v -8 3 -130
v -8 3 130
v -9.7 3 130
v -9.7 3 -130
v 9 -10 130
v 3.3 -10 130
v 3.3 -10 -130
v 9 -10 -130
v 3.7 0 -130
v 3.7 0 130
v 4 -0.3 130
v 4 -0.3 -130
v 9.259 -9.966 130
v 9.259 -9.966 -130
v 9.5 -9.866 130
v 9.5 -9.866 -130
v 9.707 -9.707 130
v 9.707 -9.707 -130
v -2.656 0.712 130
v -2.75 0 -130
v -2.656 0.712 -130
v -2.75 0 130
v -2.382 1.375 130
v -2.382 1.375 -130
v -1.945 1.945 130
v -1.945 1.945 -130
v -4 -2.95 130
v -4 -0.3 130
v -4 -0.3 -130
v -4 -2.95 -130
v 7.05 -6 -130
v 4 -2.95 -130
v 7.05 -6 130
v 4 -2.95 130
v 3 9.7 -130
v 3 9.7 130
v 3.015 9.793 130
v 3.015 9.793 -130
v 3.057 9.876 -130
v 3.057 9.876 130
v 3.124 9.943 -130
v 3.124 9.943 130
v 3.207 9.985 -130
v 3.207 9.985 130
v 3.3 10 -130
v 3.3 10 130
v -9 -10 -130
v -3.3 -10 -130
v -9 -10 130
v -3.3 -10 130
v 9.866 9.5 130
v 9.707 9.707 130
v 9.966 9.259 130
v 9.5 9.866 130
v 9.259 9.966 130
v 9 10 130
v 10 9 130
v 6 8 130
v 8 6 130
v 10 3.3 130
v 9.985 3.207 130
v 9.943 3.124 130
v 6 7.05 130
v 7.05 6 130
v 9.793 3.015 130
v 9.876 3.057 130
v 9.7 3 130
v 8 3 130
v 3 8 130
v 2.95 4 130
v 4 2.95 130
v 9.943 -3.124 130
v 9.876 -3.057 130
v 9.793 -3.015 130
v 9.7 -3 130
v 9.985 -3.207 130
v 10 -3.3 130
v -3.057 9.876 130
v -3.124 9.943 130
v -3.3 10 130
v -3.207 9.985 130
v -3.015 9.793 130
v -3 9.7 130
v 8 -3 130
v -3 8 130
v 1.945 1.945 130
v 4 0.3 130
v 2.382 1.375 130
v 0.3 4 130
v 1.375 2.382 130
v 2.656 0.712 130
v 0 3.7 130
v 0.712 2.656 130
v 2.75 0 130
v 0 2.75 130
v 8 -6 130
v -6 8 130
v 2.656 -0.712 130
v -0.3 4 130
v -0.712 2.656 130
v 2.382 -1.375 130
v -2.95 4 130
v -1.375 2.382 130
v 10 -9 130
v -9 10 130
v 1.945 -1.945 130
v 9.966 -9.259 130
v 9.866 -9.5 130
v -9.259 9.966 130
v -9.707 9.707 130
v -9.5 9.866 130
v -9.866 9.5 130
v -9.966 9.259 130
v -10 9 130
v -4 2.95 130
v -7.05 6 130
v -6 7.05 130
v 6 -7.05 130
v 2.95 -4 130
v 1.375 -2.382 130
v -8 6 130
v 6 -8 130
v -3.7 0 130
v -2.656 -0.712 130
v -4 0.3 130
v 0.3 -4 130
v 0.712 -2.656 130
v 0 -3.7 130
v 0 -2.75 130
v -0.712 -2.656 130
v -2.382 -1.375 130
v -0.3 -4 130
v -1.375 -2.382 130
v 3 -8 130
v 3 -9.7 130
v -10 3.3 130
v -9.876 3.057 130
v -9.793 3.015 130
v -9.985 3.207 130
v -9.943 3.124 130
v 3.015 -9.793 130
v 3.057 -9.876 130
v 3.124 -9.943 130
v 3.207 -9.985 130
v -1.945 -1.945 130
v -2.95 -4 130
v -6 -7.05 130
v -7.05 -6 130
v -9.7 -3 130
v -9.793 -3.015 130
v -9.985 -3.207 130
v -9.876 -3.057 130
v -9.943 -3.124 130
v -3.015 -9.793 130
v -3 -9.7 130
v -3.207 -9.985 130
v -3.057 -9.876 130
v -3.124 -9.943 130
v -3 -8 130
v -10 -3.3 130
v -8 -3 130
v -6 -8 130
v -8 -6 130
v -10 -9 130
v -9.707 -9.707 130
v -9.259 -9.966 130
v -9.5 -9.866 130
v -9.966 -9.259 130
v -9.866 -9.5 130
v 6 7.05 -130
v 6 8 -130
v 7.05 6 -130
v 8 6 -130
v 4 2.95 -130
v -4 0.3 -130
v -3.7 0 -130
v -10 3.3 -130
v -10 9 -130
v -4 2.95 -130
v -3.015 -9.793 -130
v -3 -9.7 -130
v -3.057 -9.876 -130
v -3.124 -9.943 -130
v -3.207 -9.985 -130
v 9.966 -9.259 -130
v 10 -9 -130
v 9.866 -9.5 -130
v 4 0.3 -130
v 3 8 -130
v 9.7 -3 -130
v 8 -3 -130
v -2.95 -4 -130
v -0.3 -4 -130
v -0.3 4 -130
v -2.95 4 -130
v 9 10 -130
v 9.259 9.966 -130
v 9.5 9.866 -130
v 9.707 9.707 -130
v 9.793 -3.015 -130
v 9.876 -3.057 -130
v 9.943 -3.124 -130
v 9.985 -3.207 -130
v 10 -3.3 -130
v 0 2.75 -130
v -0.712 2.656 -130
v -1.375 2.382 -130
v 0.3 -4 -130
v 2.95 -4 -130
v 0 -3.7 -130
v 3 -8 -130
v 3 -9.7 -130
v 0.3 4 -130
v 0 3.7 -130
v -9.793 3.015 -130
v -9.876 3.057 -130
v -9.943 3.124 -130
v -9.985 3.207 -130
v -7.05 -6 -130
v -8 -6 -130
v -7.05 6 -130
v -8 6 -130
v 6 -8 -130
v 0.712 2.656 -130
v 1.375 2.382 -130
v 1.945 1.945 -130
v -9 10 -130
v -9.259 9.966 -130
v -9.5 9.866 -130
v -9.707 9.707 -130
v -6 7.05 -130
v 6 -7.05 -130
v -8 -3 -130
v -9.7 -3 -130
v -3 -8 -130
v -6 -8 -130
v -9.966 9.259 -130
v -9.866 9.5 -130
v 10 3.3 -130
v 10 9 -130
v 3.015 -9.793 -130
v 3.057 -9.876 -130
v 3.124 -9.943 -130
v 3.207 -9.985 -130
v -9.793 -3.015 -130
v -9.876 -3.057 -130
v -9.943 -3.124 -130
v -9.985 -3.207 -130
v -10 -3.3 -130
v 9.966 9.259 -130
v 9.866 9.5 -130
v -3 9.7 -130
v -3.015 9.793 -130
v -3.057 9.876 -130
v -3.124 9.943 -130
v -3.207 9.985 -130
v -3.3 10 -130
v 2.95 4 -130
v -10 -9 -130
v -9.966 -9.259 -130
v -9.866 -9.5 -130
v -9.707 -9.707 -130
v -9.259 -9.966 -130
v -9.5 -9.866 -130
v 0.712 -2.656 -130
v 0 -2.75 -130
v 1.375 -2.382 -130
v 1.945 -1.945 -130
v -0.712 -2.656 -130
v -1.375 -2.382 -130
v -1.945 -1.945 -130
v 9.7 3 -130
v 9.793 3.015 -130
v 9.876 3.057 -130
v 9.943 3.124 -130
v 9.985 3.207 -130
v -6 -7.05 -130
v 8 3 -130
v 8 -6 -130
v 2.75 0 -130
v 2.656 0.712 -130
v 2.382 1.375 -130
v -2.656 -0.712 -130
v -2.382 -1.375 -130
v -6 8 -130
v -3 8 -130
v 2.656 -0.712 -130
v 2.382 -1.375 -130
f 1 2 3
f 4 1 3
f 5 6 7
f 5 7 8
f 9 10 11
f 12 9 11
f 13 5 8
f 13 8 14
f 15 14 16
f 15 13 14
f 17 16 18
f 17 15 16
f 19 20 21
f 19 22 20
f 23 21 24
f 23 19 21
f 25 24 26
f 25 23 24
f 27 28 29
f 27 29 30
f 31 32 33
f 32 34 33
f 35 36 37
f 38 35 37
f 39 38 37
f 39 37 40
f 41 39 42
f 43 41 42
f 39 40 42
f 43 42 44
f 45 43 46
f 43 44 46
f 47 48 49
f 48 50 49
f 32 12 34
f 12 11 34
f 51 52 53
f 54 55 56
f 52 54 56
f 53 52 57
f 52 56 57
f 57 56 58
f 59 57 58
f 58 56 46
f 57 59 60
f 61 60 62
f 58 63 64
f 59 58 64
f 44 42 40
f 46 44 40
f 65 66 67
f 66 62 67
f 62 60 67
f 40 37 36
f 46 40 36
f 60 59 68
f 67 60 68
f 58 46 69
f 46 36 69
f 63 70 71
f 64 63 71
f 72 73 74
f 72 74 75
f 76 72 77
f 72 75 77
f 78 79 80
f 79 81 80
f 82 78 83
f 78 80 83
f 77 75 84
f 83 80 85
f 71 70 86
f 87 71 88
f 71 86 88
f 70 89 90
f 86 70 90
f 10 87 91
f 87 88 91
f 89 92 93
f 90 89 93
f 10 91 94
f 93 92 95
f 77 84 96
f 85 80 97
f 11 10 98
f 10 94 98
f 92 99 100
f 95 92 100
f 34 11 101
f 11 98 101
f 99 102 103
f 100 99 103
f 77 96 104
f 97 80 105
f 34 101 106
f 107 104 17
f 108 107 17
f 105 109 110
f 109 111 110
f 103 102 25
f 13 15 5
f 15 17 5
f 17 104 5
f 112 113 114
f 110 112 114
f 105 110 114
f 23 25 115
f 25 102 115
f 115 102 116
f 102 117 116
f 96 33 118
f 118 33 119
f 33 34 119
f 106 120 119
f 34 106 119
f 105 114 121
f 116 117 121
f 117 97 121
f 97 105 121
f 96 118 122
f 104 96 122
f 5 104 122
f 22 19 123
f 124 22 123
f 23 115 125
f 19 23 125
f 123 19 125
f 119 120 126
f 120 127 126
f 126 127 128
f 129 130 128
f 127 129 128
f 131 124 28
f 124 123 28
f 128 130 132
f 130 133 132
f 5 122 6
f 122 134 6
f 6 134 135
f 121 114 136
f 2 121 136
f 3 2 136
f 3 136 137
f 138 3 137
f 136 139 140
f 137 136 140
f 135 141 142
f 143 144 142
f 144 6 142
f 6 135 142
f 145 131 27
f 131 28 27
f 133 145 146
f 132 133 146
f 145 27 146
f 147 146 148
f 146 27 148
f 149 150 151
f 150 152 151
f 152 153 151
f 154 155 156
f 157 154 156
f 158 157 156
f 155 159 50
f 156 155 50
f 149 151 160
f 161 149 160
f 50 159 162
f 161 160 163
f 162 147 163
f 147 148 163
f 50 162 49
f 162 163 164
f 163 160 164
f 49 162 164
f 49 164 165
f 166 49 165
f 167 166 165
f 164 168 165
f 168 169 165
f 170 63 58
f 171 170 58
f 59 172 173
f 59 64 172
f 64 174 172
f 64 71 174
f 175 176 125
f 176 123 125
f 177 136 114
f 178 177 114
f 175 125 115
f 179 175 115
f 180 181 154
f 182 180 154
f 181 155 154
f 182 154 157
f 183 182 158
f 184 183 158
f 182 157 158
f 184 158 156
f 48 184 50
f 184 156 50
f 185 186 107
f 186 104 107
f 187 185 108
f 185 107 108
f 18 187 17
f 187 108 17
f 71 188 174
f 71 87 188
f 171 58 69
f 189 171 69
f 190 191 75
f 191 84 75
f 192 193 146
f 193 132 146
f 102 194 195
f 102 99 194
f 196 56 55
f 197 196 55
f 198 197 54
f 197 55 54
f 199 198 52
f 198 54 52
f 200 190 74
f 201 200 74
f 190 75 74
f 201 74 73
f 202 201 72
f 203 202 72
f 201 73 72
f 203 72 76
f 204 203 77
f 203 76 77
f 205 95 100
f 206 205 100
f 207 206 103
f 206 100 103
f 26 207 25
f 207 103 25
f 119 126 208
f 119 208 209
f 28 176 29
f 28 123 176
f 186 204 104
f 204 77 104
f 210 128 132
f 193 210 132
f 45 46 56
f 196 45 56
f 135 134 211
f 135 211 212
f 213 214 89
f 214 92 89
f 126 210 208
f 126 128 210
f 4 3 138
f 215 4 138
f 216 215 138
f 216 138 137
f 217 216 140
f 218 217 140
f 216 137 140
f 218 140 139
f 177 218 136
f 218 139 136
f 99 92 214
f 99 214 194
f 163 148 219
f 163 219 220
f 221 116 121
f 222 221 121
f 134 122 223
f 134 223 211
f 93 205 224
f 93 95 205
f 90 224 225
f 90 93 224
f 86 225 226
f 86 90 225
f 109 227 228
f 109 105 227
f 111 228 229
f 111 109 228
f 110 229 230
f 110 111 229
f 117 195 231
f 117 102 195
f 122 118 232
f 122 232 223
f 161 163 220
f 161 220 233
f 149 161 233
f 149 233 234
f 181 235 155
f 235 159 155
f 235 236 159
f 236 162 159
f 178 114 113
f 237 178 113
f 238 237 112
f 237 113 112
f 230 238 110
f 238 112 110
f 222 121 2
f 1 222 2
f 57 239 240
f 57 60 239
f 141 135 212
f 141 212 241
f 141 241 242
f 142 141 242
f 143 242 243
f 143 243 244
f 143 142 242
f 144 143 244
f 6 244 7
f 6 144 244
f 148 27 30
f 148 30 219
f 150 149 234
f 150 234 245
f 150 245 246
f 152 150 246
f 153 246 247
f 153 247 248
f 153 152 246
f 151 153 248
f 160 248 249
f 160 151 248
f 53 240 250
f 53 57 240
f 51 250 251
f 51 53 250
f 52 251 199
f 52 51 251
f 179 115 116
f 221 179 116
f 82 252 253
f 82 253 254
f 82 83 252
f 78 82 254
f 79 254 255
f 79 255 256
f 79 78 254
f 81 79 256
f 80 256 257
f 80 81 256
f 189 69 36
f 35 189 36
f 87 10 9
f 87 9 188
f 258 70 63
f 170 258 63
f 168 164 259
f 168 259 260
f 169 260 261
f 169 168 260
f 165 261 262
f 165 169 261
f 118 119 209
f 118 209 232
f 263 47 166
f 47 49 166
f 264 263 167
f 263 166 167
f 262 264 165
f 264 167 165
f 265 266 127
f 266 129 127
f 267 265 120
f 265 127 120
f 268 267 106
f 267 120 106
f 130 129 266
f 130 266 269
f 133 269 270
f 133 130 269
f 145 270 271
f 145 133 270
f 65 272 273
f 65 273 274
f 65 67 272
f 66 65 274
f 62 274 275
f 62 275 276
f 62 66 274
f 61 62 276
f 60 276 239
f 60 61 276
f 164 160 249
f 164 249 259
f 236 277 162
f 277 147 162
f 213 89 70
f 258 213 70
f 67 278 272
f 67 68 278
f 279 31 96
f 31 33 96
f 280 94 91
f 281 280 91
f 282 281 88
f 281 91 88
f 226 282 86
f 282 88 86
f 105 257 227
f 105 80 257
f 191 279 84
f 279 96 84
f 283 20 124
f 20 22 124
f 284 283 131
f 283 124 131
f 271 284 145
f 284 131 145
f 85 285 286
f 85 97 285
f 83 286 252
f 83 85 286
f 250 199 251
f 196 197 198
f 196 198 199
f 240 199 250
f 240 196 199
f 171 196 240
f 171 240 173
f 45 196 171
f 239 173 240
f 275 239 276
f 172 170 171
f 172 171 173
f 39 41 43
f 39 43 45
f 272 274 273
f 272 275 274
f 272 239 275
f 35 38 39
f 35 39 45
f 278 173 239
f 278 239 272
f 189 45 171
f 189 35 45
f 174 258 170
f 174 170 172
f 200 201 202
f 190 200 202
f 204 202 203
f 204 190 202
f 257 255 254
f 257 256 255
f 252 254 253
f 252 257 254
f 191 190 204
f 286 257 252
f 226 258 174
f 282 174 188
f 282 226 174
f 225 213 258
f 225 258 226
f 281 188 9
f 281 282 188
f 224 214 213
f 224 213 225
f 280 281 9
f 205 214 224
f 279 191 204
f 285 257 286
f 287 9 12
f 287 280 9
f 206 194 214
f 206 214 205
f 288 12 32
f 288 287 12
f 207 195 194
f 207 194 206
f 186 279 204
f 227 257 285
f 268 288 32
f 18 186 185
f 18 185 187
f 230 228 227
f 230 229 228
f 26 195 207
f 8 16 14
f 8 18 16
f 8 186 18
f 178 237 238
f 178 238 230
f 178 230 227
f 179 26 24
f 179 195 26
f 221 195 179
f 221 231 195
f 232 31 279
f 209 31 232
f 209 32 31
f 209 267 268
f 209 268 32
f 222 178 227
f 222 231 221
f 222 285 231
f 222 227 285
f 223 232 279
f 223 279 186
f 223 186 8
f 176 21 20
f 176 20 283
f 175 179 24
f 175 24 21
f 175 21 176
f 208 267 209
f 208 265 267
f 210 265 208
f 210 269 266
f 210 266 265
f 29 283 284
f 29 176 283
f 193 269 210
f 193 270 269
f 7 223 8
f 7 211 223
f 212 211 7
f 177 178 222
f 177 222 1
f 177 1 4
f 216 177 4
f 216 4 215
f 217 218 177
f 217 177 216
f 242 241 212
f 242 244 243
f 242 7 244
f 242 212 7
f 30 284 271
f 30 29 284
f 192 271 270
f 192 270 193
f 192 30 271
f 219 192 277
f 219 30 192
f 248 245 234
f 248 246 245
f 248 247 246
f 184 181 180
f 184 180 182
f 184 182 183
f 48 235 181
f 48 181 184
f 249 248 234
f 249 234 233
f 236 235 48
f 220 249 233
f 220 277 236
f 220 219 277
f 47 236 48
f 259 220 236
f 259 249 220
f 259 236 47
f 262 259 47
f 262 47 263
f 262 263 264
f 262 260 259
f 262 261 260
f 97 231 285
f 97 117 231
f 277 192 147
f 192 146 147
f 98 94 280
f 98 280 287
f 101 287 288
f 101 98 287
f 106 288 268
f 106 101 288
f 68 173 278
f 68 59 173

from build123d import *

# Parameters (mm, degrees)
PAD001_DEPTH                             = 130
PAD001_MIRRORED003_2_DEPTH               = 130
PAD001_MIRRORED004_2_DEPTH               = 130
PAD001_MIRRORED003_2_MIRRORED004_2_DEPTH = 130


with BuildPart() as part:
    # Sketch001 → Pad001 (new body, symmetric)
    with BuildSketch(Plane.XY):
        with BuildLine():
            Line((-3.7, 0), (-4, -0.3))
            Line((-4, -0.3), (-4, -2.95))
            Line((-4, -2.95), (-7.05, -6))
            Line((-7.05, -6), (-8, -6))
            Line((-8, -6), (-8, -3))
            Line((-8, -3), (-9.7, -3))
            ThreePointArc((-9.7, -3), (-9.912132, -3.087868), (-10, -3.3))
            Line((-10, -3.3), (-10, -9))
            ThreePointArc((-10, -9), (-9.92388, -9.382683), (-9.707107, -9.707107))
            Line((-1.944544, -1.944544), (-9.707107, -9.707107))
            ThreePointArc((-2.75, 0), (-2.540669, -1.052379), (-1.944544, -1.944544))
            Line((-3.7, 0), (-2.75, 0))
        make_face()
    pad001 = extrude(amount=PAD001_DEPTH, both=True)

    # Sketch001 Mirrored003 2 → Pad001 Mirrored003 2 (add, symmetric)
    with BuildSketch(Plane.YX):
        with BuildLine():
            Line((-3.7, 0), (-4, -0.3))
            Line((-4, -0.3), (-4, -2.95))
            Line((-4, -2.95), (-7.05, -6))
            Line((-7.05, -6), (-8, -6))
            Line((-8, -6), (-8, -3))
            Line((-8, -3), (-9.7, -3))
            ThreePointArc((-9.7, -3), (-9.912132, -3.087868), (-10, -3.3))
            Line((-10, -3.3), (-10, -9))
            ThreePointArc((-10, -9), (-9.92388, -9.382683), (-9.707107, -9.707107))
            Line((-1.944544, -1.944544), (-9.707107, -9.707107))
            ThreePointArc((-2.75, 0), (-2.540669, -1.052379), (-1.944544, -1.944544))
            Line((-3.7, 0), (-2.75, 0))
        make_face()
    pad001_mirrored003_2 = extrude(amount=-PAD001_MIRRORED003_2_DEPTH, both=True)

    # Sketch001 Mirrored004 2 → Pad001 Mirrored004 2 (add, symmetric)
    with BuildSketch(Plane(origin=(0, 0, 0), x_dir=(-1, 0, 0), z_dir=(0, 0, -1))):
        with BuildLine():
            Line((-3.7, 0), (-4, -0.3))
            Line((-4, -0.3), (-4, -2.95))
            Line((-4, -2.95), (-7.05, -6))
            Line((-7.05, -6), (-8, -6))
            Line((-8, -6), (-8, -3))
            Line((-8, -3), (-9.7, -3))
            ThreePointArc((-9.7, -3), (-9.912132, -3.087868), (-10, -3.3))
            Line((-10, -3.3), (-10, -9))
            ThreePointArc((-10, -9), (-9.92388, -9.382683), (-9.707107, -9.707107))
            Line((-1.944544, -1.944544), (-9.707107, -9.707107))
            ThreePointArc((-2.75, 0), (-2.540669, -1.052379), (-1.944544, -1.944544))
            Line((-3.7, 0), (-2.75, 0))
        make_face()
    pad001_mirrored004_2 = extrude(amount=-PAD001_MIRRORED004_2_DEPTH, both=True)

    # Sketch001 Mirrored003 2 Mirrored004 2 → Pad001 Mirrored003 2 Mirrored004 2 (add, symmetric)
    with BuildSketch(Plane(origin=(0, 0, 0), x_dir=(0, 1, 0), z_dir=(0, 0, 1))):
        with BuildLine():
            Line((-3.7, 0), (-4, -0.3))
            Line((-4, -0.3), (-4, -2.95))
            Line((-4, -2.95), (-7.05, -6))
            Line((-7.05, -6), (-8, -6))
            Line((-8, -6), (-8, -3))
            Line((-8, -3), (-9.7, -3))
            ThreePointArc((-9.7, -3), (-9.912132, -3.087868), (-10, -3.3))
            Line((-10, -3.3), (-10, -9))
            ThreePointArc((-10, -9), (-9.92388, -9.382683), (-9.707107, -9.707107))
            Line((-1.944544, -1.944544), (-9.707107, -9.707107))
            ThreePointArc((-2.75, 0), (-2.540669, -1.052379), (-1.944544, -1.944544))
            Line((-3.7, 0), (-2.75, 0))
        make_face()
    pad001_mirrored003_2_mirrored004_2 = extrude(amount=PAD001_MIRRORED003_2_MIRRORED004_2_DEPTH, both=True)

    # Mirrored005: Pad001, Pad001 Mirrored003 2, Pad001 Mirrored004 2, Pad001 Mirrored003 2 Mirrored004 2 across Sketch001 H_Axis
    add(pad001.mirror(Plane.ZX))
    add(pad001_mirrored003_2.mirror(Plane.ZX))
    add(pad001_mirrored004_2.mirror(Plane.ZX))
    add(pad001_mirrored003_2_mirrored004_2.mirror(Plane.ZX))


solid = part.part
